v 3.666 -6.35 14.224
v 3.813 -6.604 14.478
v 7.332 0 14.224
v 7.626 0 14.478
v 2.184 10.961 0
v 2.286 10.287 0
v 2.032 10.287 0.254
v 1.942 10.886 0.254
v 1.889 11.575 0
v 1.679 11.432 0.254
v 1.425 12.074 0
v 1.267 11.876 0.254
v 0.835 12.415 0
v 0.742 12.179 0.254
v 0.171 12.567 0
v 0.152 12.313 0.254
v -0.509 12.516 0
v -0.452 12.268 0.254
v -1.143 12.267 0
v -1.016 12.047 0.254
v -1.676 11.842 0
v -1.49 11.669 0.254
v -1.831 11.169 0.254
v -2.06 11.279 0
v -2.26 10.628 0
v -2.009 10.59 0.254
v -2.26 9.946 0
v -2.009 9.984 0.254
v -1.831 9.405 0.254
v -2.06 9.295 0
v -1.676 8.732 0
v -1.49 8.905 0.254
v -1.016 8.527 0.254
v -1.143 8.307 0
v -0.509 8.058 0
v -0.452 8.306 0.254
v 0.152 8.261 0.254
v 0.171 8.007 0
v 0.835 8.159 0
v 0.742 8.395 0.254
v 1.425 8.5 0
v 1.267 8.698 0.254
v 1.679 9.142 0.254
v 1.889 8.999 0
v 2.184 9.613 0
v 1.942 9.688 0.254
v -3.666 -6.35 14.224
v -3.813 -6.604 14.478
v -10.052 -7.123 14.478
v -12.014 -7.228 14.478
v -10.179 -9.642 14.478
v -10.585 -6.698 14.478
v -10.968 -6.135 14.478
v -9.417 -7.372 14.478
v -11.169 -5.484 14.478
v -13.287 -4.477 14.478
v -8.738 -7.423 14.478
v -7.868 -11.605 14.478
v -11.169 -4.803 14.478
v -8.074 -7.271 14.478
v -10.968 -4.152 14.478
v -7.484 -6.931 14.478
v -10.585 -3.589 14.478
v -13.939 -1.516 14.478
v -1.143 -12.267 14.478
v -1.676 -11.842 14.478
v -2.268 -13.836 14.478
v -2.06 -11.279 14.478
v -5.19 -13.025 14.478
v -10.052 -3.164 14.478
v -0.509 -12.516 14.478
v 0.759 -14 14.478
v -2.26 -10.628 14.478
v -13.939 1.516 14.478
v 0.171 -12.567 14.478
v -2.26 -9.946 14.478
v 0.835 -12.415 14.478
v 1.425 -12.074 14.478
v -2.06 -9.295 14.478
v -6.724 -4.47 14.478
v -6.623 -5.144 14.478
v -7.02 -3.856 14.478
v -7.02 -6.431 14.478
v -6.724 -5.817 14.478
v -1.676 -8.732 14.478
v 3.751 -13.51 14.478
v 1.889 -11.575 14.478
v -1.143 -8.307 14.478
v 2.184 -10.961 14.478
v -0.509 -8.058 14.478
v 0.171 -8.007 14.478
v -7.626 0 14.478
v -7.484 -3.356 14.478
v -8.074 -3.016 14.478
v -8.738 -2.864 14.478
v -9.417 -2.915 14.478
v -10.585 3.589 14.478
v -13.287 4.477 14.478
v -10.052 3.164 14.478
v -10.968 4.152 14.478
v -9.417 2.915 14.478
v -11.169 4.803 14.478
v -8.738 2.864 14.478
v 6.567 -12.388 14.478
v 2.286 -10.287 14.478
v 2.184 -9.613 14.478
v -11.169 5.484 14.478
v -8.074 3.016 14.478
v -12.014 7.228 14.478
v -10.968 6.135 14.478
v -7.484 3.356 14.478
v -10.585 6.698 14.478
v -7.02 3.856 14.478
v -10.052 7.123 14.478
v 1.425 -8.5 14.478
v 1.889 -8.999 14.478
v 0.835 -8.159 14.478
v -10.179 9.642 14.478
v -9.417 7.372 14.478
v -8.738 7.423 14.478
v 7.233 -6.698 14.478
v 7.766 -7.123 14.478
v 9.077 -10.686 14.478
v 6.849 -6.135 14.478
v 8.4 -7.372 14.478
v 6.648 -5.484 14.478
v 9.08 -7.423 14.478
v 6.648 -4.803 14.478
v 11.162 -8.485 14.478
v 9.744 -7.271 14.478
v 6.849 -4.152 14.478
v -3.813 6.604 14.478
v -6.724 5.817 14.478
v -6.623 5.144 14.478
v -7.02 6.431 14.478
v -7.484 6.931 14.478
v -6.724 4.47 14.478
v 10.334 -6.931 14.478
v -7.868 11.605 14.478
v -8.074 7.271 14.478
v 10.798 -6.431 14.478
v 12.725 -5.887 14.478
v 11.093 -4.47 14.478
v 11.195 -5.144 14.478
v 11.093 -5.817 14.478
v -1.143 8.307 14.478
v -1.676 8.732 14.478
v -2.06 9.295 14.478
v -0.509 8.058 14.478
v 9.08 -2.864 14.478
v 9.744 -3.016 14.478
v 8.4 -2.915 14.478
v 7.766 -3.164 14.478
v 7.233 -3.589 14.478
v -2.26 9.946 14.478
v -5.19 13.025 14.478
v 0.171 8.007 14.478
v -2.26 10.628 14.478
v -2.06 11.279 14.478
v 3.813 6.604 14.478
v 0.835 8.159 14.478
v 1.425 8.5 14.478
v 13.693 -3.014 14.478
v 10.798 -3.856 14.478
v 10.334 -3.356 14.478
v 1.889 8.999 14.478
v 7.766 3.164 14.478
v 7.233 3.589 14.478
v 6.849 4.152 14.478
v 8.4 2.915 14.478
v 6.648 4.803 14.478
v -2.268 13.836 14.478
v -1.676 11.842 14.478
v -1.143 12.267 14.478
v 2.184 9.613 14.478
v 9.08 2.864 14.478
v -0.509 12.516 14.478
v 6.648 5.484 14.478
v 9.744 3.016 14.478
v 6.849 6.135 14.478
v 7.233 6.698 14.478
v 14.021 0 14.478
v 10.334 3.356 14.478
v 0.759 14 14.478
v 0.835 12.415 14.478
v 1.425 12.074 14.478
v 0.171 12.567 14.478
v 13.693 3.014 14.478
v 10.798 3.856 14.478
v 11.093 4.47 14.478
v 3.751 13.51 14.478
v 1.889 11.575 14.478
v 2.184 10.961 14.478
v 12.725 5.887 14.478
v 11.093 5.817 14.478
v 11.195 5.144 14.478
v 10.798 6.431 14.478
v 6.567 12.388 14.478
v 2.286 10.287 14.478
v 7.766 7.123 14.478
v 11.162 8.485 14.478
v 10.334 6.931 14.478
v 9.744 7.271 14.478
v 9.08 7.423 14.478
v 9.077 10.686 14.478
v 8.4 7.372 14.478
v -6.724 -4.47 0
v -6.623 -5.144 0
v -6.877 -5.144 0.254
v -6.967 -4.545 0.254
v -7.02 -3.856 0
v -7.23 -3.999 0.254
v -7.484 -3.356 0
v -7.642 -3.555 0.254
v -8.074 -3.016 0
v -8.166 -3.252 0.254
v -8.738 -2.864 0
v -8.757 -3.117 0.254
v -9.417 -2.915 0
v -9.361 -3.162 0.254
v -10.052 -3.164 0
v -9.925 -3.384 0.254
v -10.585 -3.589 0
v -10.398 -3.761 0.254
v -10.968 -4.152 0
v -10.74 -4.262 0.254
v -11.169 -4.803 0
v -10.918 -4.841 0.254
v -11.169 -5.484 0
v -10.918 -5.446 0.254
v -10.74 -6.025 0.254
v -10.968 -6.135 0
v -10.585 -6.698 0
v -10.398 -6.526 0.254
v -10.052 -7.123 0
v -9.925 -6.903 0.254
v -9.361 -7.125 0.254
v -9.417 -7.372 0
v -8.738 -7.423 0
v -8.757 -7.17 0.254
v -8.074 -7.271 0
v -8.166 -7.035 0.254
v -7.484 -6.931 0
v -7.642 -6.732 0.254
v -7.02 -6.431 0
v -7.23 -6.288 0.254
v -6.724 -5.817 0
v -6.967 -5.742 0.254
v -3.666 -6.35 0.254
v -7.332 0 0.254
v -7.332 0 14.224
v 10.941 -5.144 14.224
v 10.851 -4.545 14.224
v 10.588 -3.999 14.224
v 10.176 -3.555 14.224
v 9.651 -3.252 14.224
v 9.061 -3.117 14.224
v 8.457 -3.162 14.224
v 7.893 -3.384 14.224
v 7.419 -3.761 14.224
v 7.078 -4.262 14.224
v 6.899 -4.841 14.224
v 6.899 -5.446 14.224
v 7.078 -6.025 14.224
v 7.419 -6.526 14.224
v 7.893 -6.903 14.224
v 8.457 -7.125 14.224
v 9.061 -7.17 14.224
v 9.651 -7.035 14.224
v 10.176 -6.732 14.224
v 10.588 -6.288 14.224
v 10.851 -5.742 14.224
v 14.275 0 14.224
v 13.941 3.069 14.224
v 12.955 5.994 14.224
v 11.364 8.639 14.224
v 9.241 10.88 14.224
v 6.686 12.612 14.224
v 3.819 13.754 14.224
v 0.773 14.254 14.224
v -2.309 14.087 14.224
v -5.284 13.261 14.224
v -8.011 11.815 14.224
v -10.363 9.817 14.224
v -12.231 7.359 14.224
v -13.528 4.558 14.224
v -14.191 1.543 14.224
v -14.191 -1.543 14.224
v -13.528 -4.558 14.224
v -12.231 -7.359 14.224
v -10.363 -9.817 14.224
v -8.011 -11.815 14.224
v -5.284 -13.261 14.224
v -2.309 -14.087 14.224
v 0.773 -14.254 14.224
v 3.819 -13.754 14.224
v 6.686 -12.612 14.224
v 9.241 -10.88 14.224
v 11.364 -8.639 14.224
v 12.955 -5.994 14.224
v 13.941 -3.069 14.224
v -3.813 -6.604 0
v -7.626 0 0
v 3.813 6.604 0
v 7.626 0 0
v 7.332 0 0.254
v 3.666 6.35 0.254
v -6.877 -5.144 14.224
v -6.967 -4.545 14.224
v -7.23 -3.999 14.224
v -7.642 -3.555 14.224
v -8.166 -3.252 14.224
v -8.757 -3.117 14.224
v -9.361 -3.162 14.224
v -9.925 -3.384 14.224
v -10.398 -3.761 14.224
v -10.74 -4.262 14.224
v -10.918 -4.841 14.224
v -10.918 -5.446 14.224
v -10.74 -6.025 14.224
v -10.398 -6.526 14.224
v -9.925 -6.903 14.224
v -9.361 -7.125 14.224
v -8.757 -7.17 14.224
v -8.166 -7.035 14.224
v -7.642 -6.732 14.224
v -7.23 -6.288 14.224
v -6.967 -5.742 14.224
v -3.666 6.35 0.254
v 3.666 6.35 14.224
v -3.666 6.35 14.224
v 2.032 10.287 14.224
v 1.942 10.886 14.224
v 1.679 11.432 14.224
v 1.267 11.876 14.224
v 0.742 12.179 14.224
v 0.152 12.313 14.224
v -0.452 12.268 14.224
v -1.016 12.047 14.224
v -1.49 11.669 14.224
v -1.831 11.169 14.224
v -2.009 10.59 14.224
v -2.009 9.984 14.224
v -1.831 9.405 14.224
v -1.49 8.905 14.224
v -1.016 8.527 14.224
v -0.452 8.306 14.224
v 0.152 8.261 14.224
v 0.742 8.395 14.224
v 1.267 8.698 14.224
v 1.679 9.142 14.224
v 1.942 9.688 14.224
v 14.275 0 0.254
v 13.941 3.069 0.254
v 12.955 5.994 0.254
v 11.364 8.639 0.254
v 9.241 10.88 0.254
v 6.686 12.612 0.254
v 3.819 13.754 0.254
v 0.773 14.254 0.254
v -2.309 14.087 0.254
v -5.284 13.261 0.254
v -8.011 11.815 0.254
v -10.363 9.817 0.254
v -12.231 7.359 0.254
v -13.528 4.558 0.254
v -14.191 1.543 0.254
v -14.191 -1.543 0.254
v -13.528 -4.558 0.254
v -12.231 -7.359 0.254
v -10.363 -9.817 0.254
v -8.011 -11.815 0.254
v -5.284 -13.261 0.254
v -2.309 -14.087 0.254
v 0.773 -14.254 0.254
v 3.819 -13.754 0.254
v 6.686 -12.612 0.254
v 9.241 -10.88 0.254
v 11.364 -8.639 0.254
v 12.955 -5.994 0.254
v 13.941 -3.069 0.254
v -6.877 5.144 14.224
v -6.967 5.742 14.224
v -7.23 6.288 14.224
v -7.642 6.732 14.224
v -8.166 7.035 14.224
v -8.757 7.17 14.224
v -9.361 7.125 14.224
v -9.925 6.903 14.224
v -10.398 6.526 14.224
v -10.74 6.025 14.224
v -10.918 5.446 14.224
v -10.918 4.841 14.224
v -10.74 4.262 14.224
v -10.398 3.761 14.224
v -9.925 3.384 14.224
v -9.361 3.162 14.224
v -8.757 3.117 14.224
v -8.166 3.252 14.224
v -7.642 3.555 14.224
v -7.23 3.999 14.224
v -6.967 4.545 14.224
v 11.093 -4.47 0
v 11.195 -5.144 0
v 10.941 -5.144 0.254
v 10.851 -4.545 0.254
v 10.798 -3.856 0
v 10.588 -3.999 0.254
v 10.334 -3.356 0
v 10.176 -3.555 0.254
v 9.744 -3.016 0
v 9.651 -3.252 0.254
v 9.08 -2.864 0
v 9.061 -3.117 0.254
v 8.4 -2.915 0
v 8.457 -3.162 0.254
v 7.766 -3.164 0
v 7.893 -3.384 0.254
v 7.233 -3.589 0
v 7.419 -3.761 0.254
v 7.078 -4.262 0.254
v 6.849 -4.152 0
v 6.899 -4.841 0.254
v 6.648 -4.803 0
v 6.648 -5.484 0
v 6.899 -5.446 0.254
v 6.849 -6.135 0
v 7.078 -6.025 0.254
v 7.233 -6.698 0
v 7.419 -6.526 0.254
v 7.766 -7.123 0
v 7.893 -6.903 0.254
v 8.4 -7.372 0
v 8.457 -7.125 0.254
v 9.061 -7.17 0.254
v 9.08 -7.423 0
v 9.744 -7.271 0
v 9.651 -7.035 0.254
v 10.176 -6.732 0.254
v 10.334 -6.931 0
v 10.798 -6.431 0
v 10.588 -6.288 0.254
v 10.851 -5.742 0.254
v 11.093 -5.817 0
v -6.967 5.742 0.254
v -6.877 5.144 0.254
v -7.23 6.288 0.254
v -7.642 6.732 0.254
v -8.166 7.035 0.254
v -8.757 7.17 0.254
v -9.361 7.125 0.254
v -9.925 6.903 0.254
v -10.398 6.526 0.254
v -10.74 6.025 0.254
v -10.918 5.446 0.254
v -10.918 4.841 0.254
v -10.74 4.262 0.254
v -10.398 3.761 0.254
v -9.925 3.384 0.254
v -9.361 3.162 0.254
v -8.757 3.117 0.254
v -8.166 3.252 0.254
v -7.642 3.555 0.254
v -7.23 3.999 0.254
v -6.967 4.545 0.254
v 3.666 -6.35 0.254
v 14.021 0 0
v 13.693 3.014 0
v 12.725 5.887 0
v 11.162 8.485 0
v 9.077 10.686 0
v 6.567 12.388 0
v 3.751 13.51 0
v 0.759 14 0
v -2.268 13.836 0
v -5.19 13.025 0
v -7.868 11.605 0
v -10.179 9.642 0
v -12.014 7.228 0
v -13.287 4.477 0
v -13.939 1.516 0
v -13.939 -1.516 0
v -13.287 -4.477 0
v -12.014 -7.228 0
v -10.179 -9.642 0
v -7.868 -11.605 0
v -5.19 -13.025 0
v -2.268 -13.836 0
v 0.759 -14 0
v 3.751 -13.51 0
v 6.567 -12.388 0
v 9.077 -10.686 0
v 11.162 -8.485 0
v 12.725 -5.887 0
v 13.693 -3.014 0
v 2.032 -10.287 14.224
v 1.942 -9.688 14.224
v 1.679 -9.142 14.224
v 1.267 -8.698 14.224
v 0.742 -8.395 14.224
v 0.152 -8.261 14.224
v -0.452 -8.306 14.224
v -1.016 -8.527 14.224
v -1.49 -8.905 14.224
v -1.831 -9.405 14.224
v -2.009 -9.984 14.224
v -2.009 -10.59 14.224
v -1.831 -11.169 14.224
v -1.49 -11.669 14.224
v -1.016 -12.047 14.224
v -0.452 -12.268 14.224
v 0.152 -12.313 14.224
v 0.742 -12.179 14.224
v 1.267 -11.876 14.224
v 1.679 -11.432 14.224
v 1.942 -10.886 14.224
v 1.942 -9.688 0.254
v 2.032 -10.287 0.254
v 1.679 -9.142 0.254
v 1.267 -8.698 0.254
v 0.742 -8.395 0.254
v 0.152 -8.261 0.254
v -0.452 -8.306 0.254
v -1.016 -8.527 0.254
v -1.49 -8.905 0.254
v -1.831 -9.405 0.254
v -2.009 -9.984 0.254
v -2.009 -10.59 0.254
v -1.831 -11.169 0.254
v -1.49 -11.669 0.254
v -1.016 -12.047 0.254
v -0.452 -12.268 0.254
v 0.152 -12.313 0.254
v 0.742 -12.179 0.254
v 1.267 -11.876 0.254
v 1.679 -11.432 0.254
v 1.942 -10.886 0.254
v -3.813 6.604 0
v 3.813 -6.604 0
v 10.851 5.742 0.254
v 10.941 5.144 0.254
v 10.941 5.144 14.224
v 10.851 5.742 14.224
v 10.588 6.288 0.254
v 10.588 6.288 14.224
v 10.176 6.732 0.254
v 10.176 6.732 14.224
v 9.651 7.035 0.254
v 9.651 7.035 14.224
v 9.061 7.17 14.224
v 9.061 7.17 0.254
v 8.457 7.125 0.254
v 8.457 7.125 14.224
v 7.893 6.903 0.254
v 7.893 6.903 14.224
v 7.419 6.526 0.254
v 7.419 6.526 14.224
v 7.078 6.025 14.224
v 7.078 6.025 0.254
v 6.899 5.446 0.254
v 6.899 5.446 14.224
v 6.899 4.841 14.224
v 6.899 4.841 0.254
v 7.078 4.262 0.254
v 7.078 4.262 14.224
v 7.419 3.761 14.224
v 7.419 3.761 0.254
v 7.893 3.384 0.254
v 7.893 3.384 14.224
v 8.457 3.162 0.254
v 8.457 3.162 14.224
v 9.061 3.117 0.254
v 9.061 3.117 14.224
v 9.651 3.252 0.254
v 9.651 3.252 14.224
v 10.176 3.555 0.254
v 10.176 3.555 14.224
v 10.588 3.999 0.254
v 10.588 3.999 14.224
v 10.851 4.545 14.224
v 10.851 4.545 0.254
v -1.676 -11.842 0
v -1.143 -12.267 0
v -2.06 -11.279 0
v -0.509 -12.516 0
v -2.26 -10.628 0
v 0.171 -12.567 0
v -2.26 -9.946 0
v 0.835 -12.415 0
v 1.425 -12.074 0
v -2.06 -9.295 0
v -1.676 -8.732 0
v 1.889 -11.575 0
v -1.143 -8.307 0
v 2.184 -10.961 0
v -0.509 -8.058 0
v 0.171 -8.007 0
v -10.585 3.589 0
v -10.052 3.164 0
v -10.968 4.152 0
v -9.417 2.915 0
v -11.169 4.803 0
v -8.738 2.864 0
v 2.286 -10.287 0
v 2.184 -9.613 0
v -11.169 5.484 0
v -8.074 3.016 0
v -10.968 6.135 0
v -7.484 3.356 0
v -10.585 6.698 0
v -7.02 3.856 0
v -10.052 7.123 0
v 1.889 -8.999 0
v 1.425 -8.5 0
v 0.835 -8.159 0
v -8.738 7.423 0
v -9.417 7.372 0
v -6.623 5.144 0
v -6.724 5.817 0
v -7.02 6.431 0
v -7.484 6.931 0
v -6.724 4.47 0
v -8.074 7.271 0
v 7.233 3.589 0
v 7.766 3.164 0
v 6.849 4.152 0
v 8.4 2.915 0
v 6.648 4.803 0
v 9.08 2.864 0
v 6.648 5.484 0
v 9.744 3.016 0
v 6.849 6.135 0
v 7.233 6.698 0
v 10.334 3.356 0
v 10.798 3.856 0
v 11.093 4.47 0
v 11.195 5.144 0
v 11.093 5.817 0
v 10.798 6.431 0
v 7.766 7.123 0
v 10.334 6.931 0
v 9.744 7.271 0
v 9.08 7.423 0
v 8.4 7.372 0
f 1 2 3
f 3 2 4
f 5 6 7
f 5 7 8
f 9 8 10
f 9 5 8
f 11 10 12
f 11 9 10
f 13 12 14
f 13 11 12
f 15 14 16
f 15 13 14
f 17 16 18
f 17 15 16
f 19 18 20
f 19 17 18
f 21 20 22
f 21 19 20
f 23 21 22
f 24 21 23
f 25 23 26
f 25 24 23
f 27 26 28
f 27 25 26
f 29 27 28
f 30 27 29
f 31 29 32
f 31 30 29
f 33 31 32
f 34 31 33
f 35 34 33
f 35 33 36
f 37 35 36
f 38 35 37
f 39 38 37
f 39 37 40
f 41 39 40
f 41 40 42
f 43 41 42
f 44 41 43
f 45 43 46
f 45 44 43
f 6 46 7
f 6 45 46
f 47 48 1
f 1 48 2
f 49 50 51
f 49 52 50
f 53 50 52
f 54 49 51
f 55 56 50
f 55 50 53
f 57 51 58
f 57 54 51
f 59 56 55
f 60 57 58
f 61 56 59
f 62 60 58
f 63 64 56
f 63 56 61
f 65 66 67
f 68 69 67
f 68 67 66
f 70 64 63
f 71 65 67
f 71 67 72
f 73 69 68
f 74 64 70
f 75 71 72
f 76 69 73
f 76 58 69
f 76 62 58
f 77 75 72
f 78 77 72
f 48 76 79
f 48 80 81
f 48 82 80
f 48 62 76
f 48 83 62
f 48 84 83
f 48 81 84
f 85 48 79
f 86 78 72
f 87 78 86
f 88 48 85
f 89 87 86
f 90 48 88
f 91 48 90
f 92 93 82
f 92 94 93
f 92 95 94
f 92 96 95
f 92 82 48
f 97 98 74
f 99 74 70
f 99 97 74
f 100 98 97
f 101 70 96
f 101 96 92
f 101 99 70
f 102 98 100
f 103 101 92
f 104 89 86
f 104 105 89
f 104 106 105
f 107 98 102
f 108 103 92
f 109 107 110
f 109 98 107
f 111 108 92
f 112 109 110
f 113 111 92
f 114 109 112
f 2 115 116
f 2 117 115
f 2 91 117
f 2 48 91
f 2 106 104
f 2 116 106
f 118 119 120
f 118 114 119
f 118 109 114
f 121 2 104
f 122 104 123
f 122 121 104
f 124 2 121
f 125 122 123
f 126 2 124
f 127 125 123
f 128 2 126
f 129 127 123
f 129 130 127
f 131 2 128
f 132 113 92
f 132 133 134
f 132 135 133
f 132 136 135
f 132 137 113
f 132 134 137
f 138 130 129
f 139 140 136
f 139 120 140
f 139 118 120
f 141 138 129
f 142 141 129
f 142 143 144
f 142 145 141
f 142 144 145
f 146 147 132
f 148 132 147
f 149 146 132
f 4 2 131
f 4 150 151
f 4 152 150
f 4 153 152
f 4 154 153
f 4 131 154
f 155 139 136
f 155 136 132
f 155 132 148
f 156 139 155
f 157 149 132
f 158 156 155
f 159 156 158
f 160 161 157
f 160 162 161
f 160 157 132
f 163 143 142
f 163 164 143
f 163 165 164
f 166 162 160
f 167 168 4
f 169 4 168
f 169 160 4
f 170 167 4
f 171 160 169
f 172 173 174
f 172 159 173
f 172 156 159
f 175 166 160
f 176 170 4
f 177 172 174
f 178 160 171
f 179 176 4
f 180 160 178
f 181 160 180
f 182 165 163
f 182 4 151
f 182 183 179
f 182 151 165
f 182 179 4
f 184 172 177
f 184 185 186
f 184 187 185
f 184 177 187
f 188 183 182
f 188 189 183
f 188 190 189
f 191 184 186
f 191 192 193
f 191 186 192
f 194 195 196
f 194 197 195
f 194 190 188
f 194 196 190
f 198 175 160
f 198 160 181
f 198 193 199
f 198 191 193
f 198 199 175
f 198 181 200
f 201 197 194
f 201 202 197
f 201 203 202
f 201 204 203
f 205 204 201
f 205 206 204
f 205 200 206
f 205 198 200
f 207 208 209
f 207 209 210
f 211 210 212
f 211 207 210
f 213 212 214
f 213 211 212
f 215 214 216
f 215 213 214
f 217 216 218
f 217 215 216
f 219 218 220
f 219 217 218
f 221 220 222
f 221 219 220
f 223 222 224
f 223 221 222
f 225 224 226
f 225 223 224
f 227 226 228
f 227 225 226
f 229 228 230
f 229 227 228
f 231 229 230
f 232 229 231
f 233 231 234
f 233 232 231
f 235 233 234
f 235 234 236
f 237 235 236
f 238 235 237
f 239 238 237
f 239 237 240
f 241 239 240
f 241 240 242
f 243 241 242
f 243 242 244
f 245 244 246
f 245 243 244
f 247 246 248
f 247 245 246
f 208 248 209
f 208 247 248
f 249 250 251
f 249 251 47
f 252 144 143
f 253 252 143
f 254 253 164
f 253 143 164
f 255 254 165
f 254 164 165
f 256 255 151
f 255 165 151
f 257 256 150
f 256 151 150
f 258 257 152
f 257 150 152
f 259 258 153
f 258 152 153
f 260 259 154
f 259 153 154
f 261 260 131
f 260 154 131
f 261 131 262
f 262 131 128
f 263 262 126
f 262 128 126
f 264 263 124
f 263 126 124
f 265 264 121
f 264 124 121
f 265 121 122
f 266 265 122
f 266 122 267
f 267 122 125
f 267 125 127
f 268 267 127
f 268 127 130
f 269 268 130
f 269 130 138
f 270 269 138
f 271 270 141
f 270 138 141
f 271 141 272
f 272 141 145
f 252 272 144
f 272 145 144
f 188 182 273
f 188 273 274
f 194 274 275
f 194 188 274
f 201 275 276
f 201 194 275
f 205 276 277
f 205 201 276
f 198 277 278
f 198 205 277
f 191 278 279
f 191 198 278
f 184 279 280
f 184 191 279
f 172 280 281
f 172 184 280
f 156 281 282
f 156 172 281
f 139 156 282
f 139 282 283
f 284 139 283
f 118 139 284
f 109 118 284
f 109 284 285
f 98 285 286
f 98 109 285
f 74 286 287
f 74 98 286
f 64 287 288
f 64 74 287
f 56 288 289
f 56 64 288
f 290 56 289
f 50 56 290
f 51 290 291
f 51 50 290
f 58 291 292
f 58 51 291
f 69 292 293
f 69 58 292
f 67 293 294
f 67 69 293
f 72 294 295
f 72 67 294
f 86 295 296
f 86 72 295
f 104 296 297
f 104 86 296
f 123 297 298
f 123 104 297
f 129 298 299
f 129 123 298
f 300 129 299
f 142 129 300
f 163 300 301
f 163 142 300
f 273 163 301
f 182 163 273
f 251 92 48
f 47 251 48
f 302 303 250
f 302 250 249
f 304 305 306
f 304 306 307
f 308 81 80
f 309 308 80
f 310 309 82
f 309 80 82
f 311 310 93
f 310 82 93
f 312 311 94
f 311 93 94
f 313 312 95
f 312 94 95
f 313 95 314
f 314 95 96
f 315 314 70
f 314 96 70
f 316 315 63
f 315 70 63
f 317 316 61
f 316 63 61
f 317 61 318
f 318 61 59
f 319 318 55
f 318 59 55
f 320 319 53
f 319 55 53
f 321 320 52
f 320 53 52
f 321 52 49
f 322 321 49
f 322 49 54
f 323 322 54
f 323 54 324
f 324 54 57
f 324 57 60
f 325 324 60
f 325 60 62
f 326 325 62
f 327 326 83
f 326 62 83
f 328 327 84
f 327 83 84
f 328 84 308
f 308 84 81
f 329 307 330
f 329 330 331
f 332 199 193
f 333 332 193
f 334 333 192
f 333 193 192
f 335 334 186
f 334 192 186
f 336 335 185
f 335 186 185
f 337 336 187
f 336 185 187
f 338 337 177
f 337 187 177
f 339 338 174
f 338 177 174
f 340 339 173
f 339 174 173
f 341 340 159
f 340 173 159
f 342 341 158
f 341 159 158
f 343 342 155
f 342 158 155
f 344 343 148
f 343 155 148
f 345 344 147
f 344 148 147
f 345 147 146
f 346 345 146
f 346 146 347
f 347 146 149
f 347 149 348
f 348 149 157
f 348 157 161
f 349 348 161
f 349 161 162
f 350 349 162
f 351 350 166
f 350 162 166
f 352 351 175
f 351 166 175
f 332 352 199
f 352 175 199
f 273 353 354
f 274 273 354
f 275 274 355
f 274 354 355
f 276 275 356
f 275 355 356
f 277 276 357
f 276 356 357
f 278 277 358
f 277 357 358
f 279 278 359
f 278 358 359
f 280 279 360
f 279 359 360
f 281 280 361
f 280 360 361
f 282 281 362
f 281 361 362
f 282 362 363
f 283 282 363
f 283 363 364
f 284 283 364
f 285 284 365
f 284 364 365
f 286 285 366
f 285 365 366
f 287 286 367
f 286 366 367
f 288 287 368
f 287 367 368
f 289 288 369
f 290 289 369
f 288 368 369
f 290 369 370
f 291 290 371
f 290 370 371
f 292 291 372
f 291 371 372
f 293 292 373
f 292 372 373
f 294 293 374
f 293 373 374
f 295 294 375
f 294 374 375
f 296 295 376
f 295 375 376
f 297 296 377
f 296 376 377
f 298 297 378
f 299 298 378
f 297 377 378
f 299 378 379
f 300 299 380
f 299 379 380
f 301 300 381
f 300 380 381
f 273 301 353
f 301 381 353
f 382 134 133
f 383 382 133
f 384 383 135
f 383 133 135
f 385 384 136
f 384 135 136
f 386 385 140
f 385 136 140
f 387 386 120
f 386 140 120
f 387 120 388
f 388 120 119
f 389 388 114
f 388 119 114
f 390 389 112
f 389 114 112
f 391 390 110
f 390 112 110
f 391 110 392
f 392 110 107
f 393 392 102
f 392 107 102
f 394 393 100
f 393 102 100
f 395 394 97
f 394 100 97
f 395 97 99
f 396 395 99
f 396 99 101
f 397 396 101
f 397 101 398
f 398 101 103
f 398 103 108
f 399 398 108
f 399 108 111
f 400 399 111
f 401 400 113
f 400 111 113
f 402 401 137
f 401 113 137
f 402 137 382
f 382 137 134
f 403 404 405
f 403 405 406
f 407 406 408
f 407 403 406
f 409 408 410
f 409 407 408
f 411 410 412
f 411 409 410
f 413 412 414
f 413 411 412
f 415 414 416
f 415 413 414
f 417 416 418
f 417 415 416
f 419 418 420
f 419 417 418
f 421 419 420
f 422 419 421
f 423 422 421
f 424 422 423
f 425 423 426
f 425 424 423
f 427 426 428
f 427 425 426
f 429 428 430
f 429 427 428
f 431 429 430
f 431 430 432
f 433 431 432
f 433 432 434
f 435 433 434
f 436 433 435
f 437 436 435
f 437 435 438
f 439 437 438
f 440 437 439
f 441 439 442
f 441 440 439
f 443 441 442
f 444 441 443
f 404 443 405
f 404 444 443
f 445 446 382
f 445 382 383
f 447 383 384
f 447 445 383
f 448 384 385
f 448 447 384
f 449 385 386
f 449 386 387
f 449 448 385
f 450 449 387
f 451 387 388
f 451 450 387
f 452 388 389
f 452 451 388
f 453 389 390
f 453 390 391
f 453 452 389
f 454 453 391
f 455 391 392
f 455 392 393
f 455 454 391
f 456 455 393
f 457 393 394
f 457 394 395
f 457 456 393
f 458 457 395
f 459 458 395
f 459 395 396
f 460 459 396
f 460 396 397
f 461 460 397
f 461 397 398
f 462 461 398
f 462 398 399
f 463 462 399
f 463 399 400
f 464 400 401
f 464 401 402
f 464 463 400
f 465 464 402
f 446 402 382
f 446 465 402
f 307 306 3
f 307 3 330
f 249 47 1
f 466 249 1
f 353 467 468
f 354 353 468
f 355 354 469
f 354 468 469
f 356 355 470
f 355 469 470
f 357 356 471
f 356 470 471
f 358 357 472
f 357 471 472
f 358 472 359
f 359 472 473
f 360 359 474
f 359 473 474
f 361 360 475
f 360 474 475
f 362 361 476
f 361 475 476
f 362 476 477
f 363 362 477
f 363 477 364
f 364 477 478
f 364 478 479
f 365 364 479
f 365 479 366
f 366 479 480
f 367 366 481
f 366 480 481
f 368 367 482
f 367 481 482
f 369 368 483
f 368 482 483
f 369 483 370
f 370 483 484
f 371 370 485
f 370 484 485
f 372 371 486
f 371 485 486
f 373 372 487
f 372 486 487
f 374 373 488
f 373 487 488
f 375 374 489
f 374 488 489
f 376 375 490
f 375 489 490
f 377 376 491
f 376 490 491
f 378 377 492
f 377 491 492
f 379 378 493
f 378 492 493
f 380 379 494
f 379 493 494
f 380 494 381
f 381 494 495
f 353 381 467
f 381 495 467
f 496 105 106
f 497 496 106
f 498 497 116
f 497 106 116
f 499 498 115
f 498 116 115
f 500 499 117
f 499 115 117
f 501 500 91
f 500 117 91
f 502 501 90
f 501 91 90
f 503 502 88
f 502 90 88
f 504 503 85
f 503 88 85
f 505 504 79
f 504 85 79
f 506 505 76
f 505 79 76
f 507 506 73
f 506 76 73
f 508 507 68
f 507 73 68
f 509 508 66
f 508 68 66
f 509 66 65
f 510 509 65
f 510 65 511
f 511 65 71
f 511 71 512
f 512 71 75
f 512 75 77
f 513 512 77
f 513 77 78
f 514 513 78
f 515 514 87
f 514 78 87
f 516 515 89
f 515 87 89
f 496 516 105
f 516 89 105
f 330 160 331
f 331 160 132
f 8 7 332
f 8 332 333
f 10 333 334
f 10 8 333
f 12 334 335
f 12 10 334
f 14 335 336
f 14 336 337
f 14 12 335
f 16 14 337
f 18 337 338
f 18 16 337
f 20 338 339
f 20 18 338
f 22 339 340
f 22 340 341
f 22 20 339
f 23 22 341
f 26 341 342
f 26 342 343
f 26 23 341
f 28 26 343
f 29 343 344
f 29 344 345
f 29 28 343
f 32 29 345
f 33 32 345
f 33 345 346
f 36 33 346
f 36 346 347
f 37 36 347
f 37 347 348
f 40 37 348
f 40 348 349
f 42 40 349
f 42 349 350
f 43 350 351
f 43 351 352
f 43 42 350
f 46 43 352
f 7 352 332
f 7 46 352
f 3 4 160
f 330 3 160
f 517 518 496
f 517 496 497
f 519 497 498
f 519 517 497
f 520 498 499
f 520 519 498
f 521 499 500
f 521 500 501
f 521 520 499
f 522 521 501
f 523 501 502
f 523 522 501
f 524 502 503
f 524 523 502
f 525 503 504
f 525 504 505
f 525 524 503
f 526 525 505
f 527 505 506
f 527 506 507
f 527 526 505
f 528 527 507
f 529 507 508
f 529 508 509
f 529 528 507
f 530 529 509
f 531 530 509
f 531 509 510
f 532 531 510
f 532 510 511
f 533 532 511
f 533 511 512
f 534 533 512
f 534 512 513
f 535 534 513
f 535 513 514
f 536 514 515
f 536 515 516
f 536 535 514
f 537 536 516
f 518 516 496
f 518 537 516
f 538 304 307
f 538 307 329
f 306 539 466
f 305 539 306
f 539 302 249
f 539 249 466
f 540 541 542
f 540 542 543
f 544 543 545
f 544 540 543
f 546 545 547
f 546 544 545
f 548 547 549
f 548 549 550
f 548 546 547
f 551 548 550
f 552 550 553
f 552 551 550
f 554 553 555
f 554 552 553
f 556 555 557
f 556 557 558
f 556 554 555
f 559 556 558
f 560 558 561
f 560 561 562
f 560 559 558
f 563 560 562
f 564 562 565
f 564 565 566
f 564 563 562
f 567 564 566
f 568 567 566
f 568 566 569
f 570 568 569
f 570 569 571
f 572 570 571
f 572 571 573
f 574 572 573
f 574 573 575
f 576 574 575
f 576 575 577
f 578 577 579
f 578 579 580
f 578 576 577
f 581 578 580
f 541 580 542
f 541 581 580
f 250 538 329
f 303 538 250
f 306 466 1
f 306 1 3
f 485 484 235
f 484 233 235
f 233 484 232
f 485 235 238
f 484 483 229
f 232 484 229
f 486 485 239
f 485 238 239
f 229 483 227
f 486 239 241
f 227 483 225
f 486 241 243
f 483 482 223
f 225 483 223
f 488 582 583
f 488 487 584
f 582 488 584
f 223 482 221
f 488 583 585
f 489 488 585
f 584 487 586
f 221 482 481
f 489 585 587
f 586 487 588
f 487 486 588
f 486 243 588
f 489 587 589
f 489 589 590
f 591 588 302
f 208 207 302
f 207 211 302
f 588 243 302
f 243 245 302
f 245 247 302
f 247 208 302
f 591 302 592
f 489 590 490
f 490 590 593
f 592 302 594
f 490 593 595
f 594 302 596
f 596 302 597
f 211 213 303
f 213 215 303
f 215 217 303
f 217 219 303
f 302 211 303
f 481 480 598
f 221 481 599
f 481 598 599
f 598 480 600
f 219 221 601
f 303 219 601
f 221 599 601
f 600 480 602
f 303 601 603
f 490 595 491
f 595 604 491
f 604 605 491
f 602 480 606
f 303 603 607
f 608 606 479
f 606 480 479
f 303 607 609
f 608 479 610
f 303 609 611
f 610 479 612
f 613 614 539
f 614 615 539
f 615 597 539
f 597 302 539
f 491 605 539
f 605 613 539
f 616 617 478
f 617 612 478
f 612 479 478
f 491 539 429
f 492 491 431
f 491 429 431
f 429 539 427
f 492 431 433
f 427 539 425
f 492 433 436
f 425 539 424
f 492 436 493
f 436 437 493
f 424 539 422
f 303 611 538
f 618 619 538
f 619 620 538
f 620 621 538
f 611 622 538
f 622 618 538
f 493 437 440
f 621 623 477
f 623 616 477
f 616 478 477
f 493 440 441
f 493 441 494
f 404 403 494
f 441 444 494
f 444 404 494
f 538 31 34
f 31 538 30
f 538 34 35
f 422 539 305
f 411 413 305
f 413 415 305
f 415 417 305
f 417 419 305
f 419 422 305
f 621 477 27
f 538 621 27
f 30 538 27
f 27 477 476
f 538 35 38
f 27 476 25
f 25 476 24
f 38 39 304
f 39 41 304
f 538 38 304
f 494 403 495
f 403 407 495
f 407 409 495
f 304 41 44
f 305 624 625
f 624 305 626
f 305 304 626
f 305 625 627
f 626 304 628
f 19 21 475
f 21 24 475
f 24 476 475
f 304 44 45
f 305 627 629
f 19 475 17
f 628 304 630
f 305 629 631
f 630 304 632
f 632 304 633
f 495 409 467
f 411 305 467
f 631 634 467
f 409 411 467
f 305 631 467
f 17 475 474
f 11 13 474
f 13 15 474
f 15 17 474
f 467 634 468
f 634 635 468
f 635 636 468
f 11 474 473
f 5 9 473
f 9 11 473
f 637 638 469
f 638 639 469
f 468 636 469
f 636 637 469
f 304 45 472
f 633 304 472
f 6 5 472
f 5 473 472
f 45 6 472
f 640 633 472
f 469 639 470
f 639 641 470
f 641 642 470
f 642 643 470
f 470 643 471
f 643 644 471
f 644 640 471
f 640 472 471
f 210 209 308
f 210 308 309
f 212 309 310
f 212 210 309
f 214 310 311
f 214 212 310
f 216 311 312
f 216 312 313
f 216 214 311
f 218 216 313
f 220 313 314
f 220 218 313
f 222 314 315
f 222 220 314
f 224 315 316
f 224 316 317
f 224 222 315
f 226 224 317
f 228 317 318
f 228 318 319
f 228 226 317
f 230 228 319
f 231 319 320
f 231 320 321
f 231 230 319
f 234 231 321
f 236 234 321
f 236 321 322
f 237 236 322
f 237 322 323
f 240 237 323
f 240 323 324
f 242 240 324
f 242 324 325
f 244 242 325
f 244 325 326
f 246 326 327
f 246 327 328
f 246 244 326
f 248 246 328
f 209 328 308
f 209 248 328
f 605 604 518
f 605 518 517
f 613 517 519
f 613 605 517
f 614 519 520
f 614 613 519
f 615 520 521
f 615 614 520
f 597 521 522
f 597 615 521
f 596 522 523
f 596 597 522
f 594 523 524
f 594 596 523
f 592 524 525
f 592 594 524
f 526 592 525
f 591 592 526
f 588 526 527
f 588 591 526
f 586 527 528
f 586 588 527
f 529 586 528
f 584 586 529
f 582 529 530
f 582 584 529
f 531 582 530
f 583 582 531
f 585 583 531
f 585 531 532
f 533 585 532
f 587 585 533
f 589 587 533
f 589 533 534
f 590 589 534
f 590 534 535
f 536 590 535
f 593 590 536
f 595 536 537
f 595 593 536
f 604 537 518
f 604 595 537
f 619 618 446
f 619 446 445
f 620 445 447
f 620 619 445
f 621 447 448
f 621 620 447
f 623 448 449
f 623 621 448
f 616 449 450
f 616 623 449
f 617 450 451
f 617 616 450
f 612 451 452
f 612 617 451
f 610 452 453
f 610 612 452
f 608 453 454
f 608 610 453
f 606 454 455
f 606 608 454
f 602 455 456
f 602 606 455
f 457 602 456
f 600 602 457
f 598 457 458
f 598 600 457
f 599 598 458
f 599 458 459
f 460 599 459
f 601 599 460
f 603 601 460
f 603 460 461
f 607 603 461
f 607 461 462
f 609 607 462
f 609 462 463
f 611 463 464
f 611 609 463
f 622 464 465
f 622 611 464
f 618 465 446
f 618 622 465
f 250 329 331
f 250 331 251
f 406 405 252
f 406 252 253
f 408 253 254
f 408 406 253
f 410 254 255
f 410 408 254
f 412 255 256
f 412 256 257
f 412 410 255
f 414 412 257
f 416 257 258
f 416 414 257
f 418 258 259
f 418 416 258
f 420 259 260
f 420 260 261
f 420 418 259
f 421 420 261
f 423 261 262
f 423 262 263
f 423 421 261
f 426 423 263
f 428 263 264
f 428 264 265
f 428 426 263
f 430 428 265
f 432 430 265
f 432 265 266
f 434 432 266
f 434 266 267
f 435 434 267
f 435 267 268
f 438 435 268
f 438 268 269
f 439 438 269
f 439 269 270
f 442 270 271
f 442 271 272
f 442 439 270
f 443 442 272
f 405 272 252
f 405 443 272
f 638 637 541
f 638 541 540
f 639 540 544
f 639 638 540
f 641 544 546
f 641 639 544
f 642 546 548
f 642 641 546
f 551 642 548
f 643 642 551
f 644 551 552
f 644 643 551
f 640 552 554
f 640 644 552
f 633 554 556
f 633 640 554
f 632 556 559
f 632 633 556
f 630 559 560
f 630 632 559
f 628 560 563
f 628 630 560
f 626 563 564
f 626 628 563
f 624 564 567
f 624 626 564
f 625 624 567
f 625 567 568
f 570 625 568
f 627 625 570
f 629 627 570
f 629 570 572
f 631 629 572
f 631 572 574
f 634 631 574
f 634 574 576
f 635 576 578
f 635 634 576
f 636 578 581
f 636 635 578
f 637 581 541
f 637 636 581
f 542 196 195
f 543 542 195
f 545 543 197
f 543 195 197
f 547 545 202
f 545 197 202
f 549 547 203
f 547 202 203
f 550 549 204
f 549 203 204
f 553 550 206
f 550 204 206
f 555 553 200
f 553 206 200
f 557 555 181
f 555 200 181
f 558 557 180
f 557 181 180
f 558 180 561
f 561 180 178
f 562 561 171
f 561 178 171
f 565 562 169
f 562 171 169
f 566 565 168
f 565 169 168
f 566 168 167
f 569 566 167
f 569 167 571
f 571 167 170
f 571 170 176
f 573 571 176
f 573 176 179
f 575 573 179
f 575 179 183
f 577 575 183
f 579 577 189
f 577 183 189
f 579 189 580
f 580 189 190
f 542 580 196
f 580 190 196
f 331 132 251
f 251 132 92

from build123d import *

# Parameters (mm, degrees)
SKETCH1_R           = 14.2748
SKETCH1_R_2         = 2.032
BOSS_EXTRUDE1_DEPTH = 14.478
CHAMFER1_SIZE       = 0.254


with BuildPart() as part:
    # Sketch1 → Boss-Extrude1 (new body)
    with BuildSketch(Plane.XY):
        Circle(SKETCH1_R)
        with Locations((0, 10.287)):
            Circle(SKETCH1_R_2, mode=Mode.SUBTRACT)
        with Locations((8.908803329, 5.1435)):
            Circle(SKETCH1_R_2, mode=Mode.SUBTRACT)
        with Locations((8.908803329, -5.1435)):
            Circle(SKETCH1_R_2, mode=Mode.SUBTRACT)
        with Locations((0, -10.287)):
            Circle(SKETCH1_R_2, mode=Mode.SUBTRACT)
        with Locations((-8.908803329, -5.1435)):
            Circle(SKETCH1_R_2, mode=Mode.SUBTRACT)
        with Locations((-8.908803329, 5.1435)):
            Circle(SKETCH1_R_2, mode=Mode.SUBTRACT)
        Polygon((-7.332348419, 0), (-3.666174209, -6.35), (3.666174209, -6.35), (7.332348419, 0), (3.666174209, 6.35), (-3.666174209, 6.35), align=None, mode=Mode.SUBTRACT)
    extrude(amount=BOSS_EXTRUDE1_DEPTH)

    # Chamfer1
    chamfer1_edges = [part.edges().sort_by_distance(p)[0] for p in [
        (0, -6.35, 0),
        (5.499261314, -3.175, 0),
        (5.499261314, 3.175, 0),
        (0, 6.35, 0),
        (-5.499261314, 3.175, 14.478),
        (-5.499261314, -3.175, 14.478),
        (0, -6.35, 14.478),
        (5.499261314, -3.175, 14.478),
        (5.499261314, 3.175, 14.478),
        (0, 6.35, 14.478),
        (-14.2748, 0, 0),
        (-2.032, 10.287, 0),
        (-2.032, 10.287, 14.478),
        (6.876803329, 5.1435, 0),
        (6.876803329, 5.1435, 14.478),
        (6.876803329, -5.1435, 0),
        (6.876803329, -5.1435, 14.478),
        (-2.032, -10.287, 0),
        (-2.032, -10.287, 14.478),
        (-10.940803329, -5.1435, 0),
        (-10.940803329, -5.1435, 14.478),
        (-14.2748, 0, 14.478),
        (-10.940803329, 5.1435, 0),
        (-10.940803329, 5.1435, 14.478),
        (-5.499261314, 3.175, 0),
        (-5.499261314, -3.175, 0),
    ]]
    chamfer(chamfer1_edges, length=CHAMFER1_SIZE)


solid = part.part
